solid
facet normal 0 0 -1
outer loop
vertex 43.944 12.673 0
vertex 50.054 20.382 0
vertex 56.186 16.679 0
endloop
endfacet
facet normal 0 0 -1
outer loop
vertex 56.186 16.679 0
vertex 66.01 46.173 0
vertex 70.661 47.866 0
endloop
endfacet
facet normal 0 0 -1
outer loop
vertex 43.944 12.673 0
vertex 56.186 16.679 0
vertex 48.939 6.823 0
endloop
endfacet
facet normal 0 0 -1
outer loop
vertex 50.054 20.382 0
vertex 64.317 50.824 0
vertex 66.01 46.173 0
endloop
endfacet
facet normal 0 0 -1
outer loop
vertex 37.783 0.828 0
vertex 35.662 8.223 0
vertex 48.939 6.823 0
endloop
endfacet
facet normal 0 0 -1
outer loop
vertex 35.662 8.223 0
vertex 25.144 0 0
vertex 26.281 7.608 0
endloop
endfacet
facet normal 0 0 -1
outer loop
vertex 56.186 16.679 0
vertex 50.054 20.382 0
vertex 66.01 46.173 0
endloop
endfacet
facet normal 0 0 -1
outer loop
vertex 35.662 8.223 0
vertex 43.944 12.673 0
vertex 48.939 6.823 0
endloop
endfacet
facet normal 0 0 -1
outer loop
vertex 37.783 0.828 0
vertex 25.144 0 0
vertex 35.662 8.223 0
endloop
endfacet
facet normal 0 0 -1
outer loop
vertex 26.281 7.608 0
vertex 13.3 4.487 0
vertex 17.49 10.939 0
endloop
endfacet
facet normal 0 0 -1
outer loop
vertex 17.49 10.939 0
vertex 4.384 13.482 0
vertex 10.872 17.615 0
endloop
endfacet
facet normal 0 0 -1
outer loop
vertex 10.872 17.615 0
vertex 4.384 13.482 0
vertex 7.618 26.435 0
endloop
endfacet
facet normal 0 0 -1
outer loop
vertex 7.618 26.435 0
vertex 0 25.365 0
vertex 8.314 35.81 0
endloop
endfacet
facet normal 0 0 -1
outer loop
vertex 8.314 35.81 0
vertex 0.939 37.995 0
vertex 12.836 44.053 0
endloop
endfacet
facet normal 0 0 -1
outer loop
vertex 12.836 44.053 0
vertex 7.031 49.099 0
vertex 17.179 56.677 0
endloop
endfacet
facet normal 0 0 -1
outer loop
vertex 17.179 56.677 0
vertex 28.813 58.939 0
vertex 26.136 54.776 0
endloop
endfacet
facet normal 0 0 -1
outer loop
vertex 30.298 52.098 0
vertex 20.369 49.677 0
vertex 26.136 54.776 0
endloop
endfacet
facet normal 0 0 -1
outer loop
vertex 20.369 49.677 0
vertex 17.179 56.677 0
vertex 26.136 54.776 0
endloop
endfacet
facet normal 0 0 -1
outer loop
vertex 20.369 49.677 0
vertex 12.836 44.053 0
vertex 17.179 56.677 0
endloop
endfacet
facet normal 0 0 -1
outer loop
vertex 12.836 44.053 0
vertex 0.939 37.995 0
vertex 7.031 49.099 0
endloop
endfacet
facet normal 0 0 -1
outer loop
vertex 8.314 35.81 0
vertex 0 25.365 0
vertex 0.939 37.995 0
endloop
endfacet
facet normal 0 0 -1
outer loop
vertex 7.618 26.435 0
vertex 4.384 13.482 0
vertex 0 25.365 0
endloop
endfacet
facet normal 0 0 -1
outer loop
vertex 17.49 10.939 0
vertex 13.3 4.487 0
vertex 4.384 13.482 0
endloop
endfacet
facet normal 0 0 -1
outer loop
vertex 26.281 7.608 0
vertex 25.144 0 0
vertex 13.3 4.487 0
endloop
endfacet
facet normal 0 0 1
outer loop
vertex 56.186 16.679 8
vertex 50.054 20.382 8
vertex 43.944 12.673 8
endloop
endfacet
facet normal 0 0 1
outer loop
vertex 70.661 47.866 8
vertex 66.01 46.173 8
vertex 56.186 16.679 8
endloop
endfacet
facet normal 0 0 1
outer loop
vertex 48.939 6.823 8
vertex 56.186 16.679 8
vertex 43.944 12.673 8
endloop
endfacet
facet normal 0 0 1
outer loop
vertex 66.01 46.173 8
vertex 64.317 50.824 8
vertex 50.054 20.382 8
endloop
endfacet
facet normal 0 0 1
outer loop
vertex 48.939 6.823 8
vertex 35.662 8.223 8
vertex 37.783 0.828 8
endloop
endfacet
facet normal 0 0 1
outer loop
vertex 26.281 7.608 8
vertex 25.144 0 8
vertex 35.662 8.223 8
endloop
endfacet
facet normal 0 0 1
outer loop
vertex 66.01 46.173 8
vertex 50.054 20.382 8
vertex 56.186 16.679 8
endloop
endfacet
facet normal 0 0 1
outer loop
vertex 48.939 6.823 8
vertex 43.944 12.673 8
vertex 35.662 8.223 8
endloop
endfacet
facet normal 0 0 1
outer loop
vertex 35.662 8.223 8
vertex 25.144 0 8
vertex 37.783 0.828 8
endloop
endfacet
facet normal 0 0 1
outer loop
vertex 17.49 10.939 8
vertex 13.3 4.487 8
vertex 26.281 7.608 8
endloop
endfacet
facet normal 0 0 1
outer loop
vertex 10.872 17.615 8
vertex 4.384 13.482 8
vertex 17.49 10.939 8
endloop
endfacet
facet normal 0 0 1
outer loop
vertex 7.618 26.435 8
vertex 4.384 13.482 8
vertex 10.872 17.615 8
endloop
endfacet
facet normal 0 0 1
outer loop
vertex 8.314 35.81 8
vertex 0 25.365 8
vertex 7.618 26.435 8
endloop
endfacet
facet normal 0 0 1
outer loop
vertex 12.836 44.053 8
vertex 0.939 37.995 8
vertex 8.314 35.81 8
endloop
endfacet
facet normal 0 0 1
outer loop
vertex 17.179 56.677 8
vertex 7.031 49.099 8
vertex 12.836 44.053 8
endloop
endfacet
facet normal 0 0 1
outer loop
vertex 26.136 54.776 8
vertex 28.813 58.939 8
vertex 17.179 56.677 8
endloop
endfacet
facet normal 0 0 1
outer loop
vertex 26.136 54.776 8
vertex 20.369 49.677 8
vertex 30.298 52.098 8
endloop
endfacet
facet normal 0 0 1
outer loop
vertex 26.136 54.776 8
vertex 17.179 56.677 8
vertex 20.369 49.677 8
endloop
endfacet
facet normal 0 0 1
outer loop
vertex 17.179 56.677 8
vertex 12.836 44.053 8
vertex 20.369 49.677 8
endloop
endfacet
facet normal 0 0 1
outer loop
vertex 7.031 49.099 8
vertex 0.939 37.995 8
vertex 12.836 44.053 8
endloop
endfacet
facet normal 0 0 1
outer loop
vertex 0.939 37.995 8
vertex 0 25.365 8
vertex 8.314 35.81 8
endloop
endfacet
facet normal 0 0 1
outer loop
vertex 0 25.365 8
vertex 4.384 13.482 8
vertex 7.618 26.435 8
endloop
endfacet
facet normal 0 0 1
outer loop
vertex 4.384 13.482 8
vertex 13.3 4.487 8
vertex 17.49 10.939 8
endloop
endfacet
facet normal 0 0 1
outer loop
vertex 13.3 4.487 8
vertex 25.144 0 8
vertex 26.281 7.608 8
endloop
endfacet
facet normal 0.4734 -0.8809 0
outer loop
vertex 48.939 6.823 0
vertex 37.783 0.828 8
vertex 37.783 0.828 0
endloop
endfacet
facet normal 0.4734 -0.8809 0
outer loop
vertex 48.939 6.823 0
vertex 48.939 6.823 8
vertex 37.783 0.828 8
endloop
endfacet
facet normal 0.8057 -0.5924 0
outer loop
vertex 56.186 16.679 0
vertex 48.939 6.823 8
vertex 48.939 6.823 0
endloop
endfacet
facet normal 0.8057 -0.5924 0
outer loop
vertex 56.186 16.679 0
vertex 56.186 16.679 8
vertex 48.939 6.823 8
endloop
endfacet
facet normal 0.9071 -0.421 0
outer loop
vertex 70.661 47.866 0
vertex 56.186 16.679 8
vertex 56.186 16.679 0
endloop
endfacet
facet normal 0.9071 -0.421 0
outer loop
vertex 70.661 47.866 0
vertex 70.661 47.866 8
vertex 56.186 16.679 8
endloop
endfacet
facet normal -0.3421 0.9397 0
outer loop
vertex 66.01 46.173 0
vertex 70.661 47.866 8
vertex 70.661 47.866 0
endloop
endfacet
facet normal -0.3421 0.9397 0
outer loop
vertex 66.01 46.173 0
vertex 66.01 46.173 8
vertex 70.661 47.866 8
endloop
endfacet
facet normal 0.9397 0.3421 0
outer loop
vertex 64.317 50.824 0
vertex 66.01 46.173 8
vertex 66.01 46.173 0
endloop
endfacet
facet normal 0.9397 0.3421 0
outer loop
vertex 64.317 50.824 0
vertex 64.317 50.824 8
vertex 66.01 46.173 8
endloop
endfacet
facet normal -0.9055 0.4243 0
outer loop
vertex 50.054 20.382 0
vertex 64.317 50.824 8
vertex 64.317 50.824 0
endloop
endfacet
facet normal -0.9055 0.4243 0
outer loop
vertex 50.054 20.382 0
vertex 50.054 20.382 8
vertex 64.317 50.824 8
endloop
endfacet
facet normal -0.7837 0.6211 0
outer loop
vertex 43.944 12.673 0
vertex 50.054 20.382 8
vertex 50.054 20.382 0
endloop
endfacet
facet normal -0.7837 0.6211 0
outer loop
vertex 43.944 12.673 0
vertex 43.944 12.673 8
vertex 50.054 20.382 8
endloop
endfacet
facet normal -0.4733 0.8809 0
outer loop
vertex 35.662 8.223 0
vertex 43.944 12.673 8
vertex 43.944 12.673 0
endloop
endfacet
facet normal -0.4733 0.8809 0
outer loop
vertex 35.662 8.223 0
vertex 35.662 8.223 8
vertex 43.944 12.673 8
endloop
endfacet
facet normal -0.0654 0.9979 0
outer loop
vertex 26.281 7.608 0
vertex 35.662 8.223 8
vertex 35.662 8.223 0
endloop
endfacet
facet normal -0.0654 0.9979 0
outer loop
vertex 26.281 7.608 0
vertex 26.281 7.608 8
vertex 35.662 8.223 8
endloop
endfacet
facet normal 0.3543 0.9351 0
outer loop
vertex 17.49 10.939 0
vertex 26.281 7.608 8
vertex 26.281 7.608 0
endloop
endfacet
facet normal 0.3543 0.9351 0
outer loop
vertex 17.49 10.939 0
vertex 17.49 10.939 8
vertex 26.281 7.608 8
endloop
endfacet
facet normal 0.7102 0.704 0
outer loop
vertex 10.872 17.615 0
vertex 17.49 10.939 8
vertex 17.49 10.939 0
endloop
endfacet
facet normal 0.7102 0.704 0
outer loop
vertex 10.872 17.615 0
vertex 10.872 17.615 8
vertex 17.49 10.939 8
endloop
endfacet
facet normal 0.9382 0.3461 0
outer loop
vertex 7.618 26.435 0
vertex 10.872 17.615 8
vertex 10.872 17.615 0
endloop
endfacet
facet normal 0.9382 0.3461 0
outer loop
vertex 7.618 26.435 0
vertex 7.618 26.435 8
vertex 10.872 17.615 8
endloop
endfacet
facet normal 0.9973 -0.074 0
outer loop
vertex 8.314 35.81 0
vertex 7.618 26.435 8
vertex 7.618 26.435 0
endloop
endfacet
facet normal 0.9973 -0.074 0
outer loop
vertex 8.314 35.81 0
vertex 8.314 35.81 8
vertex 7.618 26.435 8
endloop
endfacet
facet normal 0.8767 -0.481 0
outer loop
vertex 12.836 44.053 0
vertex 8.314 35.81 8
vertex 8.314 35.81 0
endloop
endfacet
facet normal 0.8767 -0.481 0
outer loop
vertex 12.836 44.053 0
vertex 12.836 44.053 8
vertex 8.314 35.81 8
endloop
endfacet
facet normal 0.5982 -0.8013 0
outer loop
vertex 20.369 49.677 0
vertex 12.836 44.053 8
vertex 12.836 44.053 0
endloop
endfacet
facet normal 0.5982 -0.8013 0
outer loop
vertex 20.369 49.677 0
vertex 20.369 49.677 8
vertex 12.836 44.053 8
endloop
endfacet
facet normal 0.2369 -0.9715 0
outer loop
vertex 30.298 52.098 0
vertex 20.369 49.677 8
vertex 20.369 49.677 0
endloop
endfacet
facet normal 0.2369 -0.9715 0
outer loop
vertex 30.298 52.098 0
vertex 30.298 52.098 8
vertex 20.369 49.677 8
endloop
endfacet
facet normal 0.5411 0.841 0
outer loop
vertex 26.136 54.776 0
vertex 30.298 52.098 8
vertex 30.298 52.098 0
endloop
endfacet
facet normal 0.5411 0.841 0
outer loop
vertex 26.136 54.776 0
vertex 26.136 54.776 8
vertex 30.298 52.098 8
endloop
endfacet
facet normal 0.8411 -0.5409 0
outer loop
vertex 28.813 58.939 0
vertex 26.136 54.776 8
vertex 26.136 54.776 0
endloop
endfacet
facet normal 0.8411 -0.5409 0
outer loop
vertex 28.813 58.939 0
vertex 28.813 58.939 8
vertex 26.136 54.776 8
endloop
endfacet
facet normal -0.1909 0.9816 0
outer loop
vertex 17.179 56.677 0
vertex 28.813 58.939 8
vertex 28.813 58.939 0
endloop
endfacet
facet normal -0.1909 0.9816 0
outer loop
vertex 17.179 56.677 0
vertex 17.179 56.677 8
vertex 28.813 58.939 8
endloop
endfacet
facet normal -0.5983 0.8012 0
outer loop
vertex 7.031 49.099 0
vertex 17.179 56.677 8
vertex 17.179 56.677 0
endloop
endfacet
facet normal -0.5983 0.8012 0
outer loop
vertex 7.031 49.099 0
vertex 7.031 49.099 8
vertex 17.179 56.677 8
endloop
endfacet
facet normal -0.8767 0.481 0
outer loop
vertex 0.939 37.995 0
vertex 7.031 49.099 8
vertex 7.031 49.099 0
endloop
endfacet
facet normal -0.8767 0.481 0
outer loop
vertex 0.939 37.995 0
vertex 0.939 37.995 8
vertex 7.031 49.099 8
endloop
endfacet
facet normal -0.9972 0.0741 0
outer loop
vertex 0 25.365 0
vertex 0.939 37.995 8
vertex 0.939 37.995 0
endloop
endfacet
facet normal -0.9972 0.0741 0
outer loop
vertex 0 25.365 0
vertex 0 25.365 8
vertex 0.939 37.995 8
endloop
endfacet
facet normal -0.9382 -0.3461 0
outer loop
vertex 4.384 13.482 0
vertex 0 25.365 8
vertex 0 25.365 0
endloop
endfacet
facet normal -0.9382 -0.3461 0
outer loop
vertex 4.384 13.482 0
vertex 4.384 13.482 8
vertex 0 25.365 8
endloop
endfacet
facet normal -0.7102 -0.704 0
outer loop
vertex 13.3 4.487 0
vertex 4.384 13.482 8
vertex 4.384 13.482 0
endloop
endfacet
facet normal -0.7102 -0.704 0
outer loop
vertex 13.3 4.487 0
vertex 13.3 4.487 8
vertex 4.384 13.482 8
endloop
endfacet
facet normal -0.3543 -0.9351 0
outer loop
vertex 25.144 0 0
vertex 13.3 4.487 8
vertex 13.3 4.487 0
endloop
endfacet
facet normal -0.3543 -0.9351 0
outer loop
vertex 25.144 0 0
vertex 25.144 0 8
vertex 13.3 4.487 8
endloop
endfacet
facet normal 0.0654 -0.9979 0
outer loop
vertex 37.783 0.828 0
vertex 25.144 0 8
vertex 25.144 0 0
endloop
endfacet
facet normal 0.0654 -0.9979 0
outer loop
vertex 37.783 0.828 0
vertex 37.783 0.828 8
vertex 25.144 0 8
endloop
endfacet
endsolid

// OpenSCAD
$fn = 32;

// ----------------------------------------------------------------------
// Hook plate: curl radius 26 mm over 245 degrees, 7 mm thick band
// ----------------------------------------------------------------------

// --- parameters (mm) ---
profile_height = 8;       // extrusion height
profile_points = 26;      // points of the closed outline

profile = [[26.136, 54.776], [28.813, 58.939], [17.179, 56.677], [7.031, 49.099], [0.939, 37.995], [0, 25.365], [4.384, 13.482], [13.3, 4.487], [25.144, 0], [37.783, 0.828], [48.939, 6.823], [56.186, 16.679], [70.661, 47.866], [66.01, 46.173], [64.317, 50.824], [50.054, 20.382], [43.944, 12.673], [35.662, 8.223], [26.281, 7.608], [17.49, 10.939], [10.872, 17.615], [7.618, 26.435], [8.314, 35.81], [12.836, 44.053], [20.369, 49.677], [30.298, 52.098]];  // single closed polygon, 26 points, counter clockwise

// --- the one profile operation ---
linear_extrude(height = profile_height) polygon(points = profile);
